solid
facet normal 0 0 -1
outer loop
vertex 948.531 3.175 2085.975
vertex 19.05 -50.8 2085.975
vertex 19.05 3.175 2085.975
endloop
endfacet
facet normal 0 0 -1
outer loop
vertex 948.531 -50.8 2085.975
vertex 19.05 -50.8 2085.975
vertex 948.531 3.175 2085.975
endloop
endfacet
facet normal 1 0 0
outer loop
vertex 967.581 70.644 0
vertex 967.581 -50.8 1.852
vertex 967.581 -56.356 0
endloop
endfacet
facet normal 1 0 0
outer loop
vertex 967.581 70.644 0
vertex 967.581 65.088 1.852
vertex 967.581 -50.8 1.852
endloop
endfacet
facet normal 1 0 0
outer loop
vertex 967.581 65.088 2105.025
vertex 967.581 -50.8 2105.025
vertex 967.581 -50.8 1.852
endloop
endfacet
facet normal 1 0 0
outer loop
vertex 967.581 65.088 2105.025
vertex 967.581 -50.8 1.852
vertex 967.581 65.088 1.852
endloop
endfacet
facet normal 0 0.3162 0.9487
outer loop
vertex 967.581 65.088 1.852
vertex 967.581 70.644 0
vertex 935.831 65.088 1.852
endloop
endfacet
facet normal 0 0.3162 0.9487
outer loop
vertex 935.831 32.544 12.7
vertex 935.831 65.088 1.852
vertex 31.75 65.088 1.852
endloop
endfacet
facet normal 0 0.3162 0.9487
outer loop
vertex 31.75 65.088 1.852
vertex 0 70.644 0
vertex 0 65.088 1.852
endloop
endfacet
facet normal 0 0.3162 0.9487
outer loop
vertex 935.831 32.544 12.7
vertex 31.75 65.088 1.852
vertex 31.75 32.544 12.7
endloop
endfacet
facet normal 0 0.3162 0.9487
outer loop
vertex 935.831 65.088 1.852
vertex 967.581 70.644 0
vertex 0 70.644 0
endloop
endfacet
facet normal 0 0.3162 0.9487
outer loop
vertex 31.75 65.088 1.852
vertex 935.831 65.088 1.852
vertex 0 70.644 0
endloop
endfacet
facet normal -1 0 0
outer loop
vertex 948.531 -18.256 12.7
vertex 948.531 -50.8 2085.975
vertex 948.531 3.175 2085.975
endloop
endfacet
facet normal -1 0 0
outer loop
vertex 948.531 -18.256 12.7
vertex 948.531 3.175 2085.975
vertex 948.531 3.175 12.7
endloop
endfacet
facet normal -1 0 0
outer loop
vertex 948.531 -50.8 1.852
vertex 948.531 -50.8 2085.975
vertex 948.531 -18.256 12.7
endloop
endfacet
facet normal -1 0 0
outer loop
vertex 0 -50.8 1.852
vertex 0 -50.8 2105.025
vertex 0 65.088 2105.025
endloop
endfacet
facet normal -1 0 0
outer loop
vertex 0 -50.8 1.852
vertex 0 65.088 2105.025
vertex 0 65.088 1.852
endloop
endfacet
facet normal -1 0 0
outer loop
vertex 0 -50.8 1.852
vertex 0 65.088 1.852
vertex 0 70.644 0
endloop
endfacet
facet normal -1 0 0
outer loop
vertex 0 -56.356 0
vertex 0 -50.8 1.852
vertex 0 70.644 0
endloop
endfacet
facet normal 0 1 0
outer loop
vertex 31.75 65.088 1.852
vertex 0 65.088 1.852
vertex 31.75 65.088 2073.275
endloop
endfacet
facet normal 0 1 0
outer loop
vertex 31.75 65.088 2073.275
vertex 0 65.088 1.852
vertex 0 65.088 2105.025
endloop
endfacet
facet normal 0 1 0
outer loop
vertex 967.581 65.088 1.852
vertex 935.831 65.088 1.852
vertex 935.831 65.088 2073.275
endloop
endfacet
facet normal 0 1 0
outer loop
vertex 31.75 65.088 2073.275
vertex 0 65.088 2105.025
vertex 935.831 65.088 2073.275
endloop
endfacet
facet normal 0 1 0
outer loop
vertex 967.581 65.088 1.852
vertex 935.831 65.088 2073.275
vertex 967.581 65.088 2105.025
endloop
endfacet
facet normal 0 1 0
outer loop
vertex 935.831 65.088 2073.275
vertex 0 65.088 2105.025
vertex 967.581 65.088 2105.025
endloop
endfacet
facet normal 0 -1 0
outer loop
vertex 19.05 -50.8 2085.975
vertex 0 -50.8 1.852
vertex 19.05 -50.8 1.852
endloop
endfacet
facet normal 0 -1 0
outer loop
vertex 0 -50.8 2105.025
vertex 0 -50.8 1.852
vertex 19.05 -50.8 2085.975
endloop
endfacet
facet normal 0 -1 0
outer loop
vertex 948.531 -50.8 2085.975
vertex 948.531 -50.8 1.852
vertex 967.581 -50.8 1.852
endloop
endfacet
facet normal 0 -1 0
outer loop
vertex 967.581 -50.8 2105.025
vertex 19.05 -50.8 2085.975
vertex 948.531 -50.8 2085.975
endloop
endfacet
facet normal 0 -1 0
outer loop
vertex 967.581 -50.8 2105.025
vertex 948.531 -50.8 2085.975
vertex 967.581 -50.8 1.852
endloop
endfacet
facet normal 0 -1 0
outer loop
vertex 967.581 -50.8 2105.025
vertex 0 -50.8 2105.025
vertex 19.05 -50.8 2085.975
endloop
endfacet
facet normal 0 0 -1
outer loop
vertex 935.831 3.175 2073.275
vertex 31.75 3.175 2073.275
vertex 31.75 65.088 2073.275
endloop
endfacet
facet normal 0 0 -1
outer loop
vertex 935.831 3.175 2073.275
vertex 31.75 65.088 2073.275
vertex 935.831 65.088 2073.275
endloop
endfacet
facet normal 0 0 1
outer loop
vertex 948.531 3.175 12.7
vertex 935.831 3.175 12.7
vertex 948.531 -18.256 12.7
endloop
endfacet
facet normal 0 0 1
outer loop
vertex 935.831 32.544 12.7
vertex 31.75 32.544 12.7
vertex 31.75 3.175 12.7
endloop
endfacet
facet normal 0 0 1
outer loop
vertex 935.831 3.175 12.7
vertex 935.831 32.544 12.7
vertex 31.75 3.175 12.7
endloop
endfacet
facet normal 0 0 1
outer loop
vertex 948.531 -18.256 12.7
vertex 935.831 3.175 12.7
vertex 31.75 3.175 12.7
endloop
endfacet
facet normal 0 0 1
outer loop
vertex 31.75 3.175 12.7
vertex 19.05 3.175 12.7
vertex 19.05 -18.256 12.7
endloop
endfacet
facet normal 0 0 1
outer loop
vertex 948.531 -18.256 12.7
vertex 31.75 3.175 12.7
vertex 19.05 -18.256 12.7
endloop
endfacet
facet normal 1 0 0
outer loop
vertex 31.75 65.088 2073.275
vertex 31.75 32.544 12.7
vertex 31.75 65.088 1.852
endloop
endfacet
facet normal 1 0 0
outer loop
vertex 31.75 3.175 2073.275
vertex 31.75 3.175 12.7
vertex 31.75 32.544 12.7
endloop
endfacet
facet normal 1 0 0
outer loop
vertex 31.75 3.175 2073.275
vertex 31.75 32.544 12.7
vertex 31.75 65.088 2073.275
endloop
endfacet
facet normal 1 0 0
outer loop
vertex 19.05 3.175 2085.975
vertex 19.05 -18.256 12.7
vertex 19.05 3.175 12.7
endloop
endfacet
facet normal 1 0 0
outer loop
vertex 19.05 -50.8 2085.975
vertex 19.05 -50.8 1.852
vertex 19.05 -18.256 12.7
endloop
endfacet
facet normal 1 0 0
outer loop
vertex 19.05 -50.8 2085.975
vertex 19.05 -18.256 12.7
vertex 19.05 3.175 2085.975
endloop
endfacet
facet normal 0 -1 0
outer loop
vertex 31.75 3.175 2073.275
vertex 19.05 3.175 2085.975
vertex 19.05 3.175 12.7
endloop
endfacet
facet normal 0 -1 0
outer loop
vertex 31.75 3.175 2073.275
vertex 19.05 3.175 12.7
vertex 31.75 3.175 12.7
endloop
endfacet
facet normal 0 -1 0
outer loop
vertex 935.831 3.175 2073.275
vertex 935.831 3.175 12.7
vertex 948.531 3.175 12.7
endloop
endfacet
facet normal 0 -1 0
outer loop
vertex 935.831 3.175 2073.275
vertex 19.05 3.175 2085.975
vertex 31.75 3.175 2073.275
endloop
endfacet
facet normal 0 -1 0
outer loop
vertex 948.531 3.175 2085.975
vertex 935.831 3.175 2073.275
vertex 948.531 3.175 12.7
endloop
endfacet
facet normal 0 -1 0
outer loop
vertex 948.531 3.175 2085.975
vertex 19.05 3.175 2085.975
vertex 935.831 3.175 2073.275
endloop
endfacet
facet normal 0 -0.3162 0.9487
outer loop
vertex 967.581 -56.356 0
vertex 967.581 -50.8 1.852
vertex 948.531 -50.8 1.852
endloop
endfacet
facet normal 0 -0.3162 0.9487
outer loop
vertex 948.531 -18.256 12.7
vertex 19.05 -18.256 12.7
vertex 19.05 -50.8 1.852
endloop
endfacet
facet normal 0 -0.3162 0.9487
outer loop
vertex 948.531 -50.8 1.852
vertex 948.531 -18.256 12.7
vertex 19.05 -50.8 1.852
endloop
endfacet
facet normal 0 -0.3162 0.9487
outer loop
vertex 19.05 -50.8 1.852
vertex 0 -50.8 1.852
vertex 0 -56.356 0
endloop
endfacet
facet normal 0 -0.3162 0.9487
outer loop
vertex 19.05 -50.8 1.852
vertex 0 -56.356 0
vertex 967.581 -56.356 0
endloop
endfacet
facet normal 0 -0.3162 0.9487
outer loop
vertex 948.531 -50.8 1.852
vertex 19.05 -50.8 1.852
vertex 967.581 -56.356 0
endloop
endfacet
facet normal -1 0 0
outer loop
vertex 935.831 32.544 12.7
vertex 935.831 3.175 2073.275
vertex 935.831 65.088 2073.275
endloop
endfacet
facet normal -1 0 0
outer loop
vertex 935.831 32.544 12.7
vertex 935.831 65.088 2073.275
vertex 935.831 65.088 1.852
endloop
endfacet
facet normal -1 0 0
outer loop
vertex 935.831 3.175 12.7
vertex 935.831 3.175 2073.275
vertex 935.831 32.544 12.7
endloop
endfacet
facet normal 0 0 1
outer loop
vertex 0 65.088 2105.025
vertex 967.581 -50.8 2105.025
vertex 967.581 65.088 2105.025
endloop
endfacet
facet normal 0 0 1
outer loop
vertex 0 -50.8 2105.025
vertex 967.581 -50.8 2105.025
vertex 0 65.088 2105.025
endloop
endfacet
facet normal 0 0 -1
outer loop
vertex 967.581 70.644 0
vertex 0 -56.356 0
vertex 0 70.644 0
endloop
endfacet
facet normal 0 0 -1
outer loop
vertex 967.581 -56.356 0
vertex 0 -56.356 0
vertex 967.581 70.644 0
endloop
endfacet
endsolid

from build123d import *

# Parameters (mm, degrees)
F3_DEPTH      = 61.9125
F5_DEPTH      = 50.8
F5_DEPTH_BACK = 3.175
F7_DEPTH      = 967.58125


with BuildPart() as f3:
    # F2 (on offset) → F3 (new body)
    with BuildSketch(Plane.XZ.offset(-3.175)):
        Polygon((0, 2085.975), (0, 0), (19.05, 0), (31.75, 0), (31.75, 2073.275), (935.83125, 2073.275), (935.83125, 0), (948.53125, 0), (967.58125, 0), (967.58125, 2105.025), (0, 2105.025), align=None)
    extrude(amount=-F3_DEPTH)

    # F4 (on Front) → F5 (join, two sides)
    with BuildSketch(Plane.XZ) as f5_sk:
        Polygon((0, 2085.975), (0, 0), (19.05, 0), (19.05, 2073.275), (19.05, 2085.975), (948.53125, 2085.975), (948.53125, 0), (967.58125, 0), (967.58125, 2105.025), (0, 2105.025), align=None)
    extrude(amount=F5_DEPTH)
    extrude(f5_sk.sketch, amount=-F5_DEPTH_BACK)

    # F6 (on Right) → F7 (join, through all)
    with BuildSketch(Plane.YZ):
        Polygon((32.54375, 12.7), (-18.25625, 12.7), (-56.35625, 0), (-50.8, 0), (7.14375, 0), (65.0875, 0), (70.64375, 0), align=None)
    extrude(amount=F7_DEPTH)


solid = f3.part
